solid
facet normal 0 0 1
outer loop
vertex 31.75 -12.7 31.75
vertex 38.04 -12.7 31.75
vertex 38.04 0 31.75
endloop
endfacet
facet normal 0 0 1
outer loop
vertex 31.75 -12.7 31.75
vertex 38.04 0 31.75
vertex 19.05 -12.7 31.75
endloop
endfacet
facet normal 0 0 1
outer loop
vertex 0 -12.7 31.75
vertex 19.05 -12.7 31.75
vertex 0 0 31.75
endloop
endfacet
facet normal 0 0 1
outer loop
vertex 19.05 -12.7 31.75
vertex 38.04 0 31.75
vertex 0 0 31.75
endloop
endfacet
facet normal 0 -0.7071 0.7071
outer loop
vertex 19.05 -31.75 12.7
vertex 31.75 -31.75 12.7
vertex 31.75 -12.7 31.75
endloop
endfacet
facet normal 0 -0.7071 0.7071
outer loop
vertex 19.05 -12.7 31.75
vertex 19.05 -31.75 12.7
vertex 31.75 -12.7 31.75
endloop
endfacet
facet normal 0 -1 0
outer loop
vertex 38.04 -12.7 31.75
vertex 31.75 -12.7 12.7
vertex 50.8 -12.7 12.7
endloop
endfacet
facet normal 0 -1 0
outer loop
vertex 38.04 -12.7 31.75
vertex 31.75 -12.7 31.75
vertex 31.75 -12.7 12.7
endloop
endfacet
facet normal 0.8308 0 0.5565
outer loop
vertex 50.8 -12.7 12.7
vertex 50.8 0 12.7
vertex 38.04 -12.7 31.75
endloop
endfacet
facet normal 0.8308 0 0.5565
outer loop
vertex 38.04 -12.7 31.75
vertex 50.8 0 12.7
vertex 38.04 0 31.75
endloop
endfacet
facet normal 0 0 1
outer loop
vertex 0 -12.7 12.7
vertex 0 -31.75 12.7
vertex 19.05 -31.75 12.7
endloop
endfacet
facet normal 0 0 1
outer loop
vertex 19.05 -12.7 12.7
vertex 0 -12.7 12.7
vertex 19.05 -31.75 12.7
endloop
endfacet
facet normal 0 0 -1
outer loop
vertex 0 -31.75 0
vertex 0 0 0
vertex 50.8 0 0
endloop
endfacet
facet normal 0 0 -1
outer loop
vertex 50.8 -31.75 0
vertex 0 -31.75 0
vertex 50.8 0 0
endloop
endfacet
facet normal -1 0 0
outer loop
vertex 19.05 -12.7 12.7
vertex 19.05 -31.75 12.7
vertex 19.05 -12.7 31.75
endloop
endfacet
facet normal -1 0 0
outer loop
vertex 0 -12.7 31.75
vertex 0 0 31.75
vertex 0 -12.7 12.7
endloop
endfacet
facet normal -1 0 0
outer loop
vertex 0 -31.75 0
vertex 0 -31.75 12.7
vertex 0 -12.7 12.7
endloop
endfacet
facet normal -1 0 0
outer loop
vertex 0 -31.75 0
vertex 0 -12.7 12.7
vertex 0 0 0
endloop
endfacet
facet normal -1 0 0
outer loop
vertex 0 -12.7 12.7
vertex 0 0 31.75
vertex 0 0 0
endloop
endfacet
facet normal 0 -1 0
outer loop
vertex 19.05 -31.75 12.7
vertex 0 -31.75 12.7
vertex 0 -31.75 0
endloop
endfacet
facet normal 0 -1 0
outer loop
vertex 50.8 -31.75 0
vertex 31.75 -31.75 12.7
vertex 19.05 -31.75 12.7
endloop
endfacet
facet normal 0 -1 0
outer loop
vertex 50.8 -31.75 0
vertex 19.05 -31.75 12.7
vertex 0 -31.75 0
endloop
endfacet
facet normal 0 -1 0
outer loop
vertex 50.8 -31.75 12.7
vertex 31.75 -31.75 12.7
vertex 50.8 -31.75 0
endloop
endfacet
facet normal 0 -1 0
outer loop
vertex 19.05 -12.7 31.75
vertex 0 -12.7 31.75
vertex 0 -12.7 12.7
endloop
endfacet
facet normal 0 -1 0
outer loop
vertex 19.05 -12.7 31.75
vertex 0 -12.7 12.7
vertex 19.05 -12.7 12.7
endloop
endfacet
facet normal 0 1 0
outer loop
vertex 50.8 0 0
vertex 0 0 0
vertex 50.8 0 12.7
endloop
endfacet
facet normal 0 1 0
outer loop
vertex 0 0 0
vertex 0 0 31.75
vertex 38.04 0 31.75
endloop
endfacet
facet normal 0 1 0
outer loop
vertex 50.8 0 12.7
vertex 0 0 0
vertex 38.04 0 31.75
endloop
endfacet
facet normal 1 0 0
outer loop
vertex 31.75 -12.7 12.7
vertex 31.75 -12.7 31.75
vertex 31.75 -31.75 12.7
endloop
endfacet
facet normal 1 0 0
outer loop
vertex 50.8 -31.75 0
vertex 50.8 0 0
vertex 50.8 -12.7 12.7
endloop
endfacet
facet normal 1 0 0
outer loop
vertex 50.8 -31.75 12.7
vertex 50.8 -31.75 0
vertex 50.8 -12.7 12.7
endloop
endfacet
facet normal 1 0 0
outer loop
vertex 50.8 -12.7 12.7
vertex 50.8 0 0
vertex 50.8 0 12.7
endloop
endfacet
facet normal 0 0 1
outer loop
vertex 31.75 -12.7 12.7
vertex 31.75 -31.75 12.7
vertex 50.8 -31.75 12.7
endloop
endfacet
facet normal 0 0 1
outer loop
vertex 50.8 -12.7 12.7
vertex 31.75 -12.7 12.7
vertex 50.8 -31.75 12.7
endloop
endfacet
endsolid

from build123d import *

# Parameters (mm, degrees)
F1_DEPTH = 31.75
F2_W     = 19.05
F2_H     = 19.05
F3_DEPTH = 19.05
F5_DEPTH = 19.05
F7_DEPTH = 25.4


with BuildPart() as f1:
    # F0 (on Front) → F1 (new body)
    with BuildSketch(Plane.XZ):
        Polygon((0, 31.75), (0, 0), (50.8, 0), (50.8, 12.7), (38.039813, 31.75), align=None)
    extrude(amount=F1_DEPTH)

    # F2 (on face) → F3 (cut)
    with BuildSketch(Plane.XZ.offset(31.75)):
        with Locations((9.525, 22.225)):
            Rectangle(F2_W, F2_H)
    extrude(amount=-F3_DEPTH, mode=Mode.SUBTRACT)

    # F4 (on face) → F5 (cut)
    with BuildSketch(Plane.XZ.offset(31.75)):
        Polygon((31.75, 12.7), (50.8, 12.7), (38.039813, 31.75), (31.75, 31.75), align=None)
    extrude(amount=-F5_DEPTH, mode=Mode.SUBTRACT)

    # F6 (on face) → F7 (cut)
    with BuildSketch(Plane.YZ.offset(31.75)):
        Polygon((-31.75, 12.7), (-12.7, 31.75), (-31.75, 31.75), align=None)
    extrude(amount=-F7_DEPTH, mode=Mode.SUBTRACT)


solid = f1.part
